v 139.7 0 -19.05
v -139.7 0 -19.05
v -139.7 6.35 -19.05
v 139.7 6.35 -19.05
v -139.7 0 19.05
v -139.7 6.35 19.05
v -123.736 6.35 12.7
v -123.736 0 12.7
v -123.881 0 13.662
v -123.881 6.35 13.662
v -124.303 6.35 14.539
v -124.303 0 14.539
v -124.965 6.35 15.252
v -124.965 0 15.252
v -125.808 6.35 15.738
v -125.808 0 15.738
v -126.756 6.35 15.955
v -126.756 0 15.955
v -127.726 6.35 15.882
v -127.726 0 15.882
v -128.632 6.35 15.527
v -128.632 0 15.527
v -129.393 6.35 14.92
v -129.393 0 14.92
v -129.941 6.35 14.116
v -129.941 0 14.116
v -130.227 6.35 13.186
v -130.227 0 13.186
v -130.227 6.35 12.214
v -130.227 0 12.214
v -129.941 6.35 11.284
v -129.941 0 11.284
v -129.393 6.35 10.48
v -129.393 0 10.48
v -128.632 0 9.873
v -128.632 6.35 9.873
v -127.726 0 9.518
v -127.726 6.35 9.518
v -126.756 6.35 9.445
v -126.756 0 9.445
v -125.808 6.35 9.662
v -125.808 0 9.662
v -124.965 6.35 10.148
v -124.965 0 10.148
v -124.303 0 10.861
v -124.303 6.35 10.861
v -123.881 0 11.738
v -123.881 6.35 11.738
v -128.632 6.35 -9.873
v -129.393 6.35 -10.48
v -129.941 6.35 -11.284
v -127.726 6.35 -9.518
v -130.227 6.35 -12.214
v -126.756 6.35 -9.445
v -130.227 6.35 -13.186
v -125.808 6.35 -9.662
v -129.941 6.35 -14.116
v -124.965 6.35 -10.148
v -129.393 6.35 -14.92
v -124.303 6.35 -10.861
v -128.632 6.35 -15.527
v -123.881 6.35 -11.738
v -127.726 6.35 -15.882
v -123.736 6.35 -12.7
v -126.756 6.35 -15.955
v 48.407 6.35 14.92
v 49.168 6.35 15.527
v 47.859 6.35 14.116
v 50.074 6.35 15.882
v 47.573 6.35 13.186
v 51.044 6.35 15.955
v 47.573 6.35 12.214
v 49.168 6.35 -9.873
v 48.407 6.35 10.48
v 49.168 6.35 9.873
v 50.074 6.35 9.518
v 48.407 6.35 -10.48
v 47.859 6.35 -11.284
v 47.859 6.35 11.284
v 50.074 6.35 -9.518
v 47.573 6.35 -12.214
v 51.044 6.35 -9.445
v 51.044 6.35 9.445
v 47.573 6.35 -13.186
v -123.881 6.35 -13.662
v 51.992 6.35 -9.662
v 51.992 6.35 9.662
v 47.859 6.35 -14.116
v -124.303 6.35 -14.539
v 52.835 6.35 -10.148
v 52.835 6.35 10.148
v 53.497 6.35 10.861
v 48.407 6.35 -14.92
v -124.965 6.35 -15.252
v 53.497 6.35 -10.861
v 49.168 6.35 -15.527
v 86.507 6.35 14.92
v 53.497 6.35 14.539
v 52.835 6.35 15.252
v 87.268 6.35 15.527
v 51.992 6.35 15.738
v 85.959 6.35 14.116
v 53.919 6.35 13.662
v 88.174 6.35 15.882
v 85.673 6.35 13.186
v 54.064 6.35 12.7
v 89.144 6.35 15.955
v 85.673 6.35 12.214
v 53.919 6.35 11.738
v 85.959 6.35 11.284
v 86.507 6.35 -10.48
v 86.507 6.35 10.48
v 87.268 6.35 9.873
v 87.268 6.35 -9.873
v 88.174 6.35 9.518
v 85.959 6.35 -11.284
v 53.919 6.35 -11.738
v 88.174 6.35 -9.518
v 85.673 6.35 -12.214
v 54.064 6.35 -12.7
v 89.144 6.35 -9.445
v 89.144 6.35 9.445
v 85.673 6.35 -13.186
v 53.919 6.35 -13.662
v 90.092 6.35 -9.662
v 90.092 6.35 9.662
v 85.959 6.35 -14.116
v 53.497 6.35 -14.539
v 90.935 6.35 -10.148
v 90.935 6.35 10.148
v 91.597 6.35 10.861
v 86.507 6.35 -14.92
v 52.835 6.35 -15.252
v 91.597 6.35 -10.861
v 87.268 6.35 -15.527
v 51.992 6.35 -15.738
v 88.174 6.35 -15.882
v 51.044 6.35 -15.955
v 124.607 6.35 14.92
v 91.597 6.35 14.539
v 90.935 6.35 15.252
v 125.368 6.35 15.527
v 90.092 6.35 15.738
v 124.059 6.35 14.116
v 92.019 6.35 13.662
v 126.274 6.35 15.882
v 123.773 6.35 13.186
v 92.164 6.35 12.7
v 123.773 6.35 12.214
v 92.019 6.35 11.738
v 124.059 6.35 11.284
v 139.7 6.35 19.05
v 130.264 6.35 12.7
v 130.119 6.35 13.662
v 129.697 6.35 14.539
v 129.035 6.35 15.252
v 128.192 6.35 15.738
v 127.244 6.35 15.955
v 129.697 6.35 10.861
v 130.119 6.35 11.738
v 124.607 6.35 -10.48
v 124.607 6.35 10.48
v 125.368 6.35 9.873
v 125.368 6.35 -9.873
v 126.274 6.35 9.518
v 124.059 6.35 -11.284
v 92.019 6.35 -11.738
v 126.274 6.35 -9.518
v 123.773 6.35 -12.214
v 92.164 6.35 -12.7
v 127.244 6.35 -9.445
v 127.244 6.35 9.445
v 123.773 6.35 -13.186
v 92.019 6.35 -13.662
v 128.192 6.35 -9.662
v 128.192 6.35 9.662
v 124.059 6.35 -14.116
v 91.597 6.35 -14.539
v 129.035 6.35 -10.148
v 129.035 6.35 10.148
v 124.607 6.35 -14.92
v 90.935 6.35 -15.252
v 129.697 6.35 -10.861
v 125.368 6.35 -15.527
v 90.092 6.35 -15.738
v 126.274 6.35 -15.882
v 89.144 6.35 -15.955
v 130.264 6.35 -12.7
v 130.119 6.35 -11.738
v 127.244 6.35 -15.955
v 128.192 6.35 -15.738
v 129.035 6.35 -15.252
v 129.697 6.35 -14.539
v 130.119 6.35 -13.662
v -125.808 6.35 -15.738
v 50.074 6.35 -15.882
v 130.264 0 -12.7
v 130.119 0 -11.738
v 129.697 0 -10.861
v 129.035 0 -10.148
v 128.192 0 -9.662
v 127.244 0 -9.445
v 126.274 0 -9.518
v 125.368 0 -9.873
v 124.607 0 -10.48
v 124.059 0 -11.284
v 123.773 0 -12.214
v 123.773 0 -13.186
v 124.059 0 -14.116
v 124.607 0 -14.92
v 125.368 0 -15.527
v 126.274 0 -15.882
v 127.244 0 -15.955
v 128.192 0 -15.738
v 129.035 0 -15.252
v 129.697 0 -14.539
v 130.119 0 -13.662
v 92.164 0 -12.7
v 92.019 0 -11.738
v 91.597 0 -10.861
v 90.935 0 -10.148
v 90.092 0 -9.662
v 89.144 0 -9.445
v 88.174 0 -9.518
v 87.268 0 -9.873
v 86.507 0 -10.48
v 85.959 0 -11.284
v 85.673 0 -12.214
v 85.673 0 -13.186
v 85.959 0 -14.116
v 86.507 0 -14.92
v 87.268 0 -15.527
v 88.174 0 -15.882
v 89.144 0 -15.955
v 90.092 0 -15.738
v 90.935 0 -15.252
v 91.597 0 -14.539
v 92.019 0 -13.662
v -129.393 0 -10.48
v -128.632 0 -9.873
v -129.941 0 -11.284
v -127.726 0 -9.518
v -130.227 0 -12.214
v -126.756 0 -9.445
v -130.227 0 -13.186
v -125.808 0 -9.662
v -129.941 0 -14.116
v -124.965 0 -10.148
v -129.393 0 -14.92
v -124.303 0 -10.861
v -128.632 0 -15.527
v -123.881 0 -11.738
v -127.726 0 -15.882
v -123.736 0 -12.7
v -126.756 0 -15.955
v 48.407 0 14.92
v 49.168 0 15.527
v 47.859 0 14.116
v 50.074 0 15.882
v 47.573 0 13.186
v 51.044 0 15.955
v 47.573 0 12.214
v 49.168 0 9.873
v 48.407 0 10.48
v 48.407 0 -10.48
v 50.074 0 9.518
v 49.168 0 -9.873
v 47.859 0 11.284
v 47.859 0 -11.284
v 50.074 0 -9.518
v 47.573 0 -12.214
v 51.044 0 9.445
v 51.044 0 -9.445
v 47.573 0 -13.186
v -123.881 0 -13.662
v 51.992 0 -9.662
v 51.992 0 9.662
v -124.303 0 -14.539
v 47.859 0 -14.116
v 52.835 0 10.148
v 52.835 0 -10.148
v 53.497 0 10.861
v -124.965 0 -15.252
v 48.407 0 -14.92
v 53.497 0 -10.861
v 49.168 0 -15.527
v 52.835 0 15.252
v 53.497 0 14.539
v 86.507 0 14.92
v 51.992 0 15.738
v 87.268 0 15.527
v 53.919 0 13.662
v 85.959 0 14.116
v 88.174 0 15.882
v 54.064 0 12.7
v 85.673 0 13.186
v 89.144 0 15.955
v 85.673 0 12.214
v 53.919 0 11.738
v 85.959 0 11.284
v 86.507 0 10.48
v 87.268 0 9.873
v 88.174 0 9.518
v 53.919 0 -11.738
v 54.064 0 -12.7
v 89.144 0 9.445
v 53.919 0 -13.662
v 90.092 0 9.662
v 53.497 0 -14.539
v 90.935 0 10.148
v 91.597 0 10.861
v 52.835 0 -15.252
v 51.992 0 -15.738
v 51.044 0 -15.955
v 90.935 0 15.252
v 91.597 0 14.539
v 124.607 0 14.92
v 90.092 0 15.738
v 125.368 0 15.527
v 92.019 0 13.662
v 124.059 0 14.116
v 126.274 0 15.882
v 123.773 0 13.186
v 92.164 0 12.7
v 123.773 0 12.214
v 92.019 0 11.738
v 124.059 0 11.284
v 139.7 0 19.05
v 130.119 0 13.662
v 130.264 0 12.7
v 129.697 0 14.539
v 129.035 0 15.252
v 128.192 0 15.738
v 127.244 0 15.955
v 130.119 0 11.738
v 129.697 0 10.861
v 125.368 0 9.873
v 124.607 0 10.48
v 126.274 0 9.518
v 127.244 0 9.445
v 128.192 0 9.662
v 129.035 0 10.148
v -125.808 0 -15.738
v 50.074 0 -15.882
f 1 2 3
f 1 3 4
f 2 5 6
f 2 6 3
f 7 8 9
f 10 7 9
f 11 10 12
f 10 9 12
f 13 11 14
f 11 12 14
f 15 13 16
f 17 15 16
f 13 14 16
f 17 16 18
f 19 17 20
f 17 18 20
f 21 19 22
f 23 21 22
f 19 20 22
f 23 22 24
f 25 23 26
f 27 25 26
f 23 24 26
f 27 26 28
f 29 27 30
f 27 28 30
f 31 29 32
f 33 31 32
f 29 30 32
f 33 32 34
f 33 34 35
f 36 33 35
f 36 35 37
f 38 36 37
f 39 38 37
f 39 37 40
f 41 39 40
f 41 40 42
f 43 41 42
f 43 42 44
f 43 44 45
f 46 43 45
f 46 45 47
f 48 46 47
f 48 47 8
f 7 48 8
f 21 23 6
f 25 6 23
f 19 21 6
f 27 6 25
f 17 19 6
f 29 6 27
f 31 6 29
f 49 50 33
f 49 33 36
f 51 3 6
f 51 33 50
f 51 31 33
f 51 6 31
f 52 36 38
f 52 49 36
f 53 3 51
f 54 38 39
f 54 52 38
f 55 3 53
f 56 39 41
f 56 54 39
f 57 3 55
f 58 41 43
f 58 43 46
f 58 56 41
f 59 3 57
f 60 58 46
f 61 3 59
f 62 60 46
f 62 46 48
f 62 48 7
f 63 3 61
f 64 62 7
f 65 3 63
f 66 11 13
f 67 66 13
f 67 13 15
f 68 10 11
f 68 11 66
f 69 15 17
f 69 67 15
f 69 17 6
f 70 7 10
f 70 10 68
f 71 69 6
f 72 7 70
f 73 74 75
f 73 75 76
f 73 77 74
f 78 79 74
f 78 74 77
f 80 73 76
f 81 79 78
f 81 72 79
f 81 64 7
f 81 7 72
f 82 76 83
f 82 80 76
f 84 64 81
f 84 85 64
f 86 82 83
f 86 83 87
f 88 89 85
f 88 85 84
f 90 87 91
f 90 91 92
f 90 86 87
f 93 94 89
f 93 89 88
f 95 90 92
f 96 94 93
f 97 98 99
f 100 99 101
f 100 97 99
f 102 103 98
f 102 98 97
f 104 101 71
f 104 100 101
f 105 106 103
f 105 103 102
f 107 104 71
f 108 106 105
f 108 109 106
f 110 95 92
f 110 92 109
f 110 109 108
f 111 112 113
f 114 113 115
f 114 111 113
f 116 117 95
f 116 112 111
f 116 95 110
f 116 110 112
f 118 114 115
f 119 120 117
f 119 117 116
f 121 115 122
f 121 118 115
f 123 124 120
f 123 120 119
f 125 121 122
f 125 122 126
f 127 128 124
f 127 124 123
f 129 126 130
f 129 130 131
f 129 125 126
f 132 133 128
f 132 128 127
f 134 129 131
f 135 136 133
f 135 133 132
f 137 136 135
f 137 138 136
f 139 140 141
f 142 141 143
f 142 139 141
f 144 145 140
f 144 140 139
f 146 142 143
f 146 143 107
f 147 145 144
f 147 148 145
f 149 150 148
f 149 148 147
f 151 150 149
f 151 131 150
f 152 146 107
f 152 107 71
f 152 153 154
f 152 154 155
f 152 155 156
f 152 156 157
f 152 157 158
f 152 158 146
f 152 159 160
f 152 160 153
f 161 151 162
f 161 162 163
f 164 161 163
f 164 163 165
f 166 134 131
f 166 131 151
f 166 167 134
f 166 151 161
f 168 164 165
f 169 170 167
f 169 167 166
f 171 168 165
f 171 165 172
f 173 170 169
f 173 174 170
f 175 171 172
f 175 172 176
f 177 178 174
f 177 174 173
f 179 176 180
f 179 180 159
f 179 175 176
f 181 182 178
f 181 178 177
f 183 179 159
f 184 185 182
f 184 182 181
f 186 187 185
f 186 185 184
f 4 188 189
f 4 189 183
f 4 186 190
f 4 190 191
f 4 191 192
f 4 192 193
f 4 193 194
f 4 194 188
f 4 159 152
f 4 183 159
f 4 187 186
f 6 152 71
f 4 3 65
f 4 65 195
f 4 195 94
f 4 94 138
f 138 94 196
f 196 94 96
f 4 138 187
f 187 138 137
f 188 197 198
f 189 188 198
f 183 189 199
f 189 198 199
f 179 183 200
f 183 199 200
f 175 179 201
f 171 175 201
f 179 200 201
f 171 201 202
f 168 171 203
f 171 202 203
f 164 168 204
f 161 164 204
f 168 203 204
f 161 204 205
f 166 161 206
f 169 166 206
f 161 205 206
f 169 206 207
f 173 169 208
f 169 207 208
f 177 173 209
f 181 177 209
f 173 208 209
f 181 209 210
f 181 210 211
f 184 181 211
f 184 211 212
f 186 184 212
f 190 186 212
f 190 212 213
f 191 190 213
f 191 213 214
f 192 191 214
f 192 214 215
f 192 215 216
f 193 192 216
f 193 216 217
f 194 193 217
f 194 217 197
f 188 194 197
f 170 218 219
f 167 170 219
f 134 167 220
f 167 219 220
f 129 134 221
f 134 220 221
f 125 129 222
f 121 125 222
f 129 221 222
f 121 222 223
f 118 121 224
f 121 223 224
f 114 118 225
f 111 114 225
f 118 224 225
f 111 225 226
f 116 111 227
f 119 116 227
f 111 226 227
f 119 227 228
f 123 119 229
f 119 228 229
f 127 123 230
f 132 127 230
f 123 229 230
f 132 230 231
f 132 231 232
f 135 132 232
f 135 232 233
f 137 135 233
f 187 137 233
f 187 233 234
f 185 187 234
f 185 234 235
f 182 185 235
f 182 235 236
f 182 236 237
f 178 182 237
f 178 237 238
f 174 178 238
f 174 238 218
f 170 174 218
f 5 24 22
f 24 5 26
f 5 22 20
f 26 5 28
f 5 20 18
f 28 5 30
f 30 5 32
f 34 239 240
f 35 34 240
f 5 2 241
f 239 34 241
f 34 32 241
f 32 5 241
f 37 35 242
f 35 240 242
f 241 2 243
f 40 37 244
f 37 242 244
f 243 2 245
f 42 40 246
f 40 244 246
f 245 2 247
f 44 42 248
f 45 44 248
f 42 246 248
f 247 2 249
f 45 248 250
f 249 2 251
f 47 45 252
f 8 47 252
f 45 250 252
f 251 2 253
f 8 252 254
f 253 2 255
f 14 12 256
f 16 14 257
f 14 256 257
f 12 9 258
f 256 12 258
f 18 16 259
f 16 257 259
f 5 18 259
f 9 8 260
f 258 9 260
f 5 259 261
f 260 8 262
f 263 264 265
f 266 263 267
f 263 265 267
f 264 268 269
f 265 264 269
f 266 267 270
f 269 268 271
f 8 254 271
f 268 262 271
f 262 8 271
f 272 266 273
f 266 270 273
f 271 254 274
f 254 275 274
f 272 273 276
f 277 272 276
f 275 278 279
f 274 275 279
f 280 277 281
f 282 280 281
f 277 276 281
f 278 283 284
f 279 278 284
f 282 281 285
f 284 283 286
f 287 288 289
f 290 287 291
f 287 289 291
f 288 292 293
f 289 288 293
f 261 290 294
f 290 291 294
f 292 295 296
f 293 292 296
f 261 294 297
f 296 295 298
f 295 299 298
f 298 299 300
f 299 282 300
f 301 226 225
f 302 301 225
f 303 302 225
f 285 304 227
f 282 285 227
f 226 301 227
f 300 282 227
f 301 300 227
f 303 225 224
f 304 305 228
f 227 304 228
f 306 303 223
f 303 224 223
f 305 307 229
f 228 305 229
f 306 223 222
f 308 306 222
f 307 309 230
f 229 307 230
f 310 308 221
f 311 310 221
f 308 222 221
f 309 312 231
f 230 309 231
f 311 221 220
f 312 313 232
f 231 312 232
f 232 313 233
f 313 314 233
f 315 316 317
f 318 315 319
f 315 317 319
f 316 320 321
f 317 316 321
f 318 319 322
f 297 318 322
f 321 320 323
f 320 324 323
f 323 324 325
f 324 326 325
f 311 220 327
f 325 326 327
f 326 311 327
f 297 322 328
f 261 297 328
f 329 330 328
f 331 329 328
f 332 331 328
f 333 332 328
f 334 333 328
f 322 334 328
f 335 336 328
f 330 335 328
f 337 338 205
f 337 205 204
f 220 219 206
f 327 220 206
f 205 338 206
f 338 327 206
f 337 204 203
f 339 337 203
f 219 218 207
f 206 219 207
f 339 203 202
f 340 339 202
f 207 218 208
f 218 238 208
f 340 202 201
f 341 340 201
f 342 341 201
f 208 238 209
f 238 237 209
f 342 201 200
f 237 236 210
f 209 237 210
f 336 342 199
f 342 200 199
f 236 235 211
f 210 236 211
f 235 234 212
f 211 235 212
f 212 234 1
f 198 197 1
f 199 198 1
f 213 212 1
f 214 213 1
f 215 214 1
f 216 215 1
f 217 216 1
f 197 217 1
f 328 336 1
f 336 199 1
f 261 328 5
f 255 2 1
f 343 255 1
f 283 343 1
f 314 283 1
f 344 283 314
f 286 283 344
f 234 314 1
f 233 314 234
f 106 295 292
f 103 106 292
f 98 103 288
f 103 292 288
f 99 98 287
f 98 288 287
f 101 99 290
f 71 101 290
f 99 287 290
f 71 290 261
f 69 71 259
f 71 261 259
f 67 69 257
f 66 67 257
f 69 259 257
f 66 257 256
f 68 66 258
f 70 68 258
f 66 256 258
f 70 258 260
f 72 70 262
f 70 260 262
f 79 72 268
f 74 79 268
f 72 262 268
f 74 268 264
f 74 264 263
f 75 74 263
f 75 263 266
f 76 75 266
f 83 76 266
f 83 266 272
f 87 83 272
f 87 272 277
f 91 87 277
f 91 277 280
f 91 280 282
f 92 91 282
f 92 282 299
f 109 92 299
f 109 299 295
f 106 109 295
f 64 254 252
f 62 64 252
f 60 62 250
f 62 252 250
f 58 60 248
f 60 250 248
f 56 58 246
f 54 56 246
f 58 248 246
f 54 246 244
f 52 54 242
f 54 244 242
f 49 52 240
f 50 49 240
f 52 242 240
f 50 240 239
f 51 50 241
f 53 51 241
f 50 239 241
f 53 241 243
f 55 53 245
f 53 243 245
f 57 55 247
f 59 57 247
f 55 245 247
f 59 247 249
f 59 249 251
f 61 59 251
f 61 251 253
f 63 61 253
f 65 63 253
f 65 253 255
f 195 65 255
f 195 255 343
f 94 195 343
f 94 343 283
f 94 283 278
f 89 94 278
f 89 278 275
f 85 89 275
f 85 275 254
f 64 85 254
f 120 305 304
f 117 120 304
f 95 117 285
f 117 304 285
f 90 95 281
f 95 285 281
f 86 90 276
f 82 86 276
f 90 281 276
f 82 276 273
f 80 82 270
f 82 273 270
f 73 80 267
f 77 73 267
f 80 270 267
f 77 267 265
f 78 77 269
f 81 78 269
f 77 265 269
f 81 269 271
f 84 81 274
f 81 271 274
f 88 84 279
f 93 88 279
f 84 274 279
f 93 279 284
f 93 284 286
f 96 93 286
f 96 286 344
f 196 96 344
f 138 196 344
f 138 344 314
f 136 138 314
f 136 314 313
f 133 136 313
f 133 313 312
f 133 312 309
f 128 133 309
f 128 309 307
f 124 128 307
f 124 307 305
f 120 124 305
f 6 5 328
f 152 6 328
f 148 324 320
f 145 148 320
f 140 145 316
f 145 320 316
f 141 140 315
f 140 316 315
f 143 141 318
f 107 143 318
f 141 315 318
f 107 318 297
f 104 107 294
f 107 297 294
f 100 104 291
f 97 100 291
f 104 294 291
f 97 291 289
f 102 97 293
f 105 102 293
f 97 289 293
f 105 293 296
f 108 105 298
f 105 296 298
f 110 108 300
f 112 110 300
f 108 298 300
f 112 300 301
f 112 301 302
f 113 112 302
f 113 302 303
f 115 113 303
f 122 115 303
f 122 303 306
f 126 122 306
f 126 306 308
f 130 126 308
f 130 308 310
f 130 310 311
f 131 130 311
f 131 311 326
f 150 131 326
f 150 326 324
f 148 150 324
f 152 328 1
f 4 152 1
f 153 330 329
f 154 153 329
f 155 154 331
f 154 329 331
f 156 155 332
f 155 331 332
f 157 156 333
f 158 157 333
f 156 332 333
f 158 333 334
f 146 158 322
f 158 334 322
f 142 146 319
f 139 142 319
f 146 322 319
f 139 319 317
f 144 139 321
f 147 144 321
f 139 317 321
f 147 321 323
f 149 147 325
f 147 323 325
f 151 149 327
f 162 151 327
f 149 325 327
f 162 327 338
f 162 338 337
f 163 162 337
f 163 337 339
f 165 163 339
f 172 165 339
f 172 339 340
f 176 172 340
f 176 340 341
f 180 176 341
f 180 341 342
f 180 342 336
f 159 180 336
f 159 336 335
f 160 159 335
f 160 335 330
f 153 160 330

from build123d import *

# Parameters (mm, degrees)
SKETCH1_W                   = 279.4
SKETCH1_H                   = 38.1
BOSS_EXTRUDE1_DEPTH         = 6.35
F_1_4_CLEARANCE_HOLE1_D     = 6.5278
F_1_4_CLEARANCE_HOLE1_DEPTH = 6.35


with BuildPart() as part:
    # Sketch1 → Boss-Extrude1 (new body)
    with BuildSketch(Plane(origin=(0, 0, 0), x_dir=(1, 0, 0), z_dir=(0, 1, 0))):
        Rectangle(SKETCH1_W, SKETCH1_H)
    extrude(amount=BOSS_EXTRUDE1_DEPTH)

    # 1/4 Clearance Hole1
    with Locations(Plane(origin=(0, 6.35, 0), x_dir=(-1, 0, 0), z_dir=(0, 1, 0))):
        with Locations((127, 12.7), (127, -12.7), (-127, -12.7), (-127, 12.7), (-88.9, -12.7), (-88.9, 12.7), (-50.8, -12.7), (-50.8, 12.7)):
            Hole(F_1_4_CLEARANCE_HOLE1_D / 2, depth=F_1_4_CLEARANCE_HOLE1_DEPTH)


solid = part.part
